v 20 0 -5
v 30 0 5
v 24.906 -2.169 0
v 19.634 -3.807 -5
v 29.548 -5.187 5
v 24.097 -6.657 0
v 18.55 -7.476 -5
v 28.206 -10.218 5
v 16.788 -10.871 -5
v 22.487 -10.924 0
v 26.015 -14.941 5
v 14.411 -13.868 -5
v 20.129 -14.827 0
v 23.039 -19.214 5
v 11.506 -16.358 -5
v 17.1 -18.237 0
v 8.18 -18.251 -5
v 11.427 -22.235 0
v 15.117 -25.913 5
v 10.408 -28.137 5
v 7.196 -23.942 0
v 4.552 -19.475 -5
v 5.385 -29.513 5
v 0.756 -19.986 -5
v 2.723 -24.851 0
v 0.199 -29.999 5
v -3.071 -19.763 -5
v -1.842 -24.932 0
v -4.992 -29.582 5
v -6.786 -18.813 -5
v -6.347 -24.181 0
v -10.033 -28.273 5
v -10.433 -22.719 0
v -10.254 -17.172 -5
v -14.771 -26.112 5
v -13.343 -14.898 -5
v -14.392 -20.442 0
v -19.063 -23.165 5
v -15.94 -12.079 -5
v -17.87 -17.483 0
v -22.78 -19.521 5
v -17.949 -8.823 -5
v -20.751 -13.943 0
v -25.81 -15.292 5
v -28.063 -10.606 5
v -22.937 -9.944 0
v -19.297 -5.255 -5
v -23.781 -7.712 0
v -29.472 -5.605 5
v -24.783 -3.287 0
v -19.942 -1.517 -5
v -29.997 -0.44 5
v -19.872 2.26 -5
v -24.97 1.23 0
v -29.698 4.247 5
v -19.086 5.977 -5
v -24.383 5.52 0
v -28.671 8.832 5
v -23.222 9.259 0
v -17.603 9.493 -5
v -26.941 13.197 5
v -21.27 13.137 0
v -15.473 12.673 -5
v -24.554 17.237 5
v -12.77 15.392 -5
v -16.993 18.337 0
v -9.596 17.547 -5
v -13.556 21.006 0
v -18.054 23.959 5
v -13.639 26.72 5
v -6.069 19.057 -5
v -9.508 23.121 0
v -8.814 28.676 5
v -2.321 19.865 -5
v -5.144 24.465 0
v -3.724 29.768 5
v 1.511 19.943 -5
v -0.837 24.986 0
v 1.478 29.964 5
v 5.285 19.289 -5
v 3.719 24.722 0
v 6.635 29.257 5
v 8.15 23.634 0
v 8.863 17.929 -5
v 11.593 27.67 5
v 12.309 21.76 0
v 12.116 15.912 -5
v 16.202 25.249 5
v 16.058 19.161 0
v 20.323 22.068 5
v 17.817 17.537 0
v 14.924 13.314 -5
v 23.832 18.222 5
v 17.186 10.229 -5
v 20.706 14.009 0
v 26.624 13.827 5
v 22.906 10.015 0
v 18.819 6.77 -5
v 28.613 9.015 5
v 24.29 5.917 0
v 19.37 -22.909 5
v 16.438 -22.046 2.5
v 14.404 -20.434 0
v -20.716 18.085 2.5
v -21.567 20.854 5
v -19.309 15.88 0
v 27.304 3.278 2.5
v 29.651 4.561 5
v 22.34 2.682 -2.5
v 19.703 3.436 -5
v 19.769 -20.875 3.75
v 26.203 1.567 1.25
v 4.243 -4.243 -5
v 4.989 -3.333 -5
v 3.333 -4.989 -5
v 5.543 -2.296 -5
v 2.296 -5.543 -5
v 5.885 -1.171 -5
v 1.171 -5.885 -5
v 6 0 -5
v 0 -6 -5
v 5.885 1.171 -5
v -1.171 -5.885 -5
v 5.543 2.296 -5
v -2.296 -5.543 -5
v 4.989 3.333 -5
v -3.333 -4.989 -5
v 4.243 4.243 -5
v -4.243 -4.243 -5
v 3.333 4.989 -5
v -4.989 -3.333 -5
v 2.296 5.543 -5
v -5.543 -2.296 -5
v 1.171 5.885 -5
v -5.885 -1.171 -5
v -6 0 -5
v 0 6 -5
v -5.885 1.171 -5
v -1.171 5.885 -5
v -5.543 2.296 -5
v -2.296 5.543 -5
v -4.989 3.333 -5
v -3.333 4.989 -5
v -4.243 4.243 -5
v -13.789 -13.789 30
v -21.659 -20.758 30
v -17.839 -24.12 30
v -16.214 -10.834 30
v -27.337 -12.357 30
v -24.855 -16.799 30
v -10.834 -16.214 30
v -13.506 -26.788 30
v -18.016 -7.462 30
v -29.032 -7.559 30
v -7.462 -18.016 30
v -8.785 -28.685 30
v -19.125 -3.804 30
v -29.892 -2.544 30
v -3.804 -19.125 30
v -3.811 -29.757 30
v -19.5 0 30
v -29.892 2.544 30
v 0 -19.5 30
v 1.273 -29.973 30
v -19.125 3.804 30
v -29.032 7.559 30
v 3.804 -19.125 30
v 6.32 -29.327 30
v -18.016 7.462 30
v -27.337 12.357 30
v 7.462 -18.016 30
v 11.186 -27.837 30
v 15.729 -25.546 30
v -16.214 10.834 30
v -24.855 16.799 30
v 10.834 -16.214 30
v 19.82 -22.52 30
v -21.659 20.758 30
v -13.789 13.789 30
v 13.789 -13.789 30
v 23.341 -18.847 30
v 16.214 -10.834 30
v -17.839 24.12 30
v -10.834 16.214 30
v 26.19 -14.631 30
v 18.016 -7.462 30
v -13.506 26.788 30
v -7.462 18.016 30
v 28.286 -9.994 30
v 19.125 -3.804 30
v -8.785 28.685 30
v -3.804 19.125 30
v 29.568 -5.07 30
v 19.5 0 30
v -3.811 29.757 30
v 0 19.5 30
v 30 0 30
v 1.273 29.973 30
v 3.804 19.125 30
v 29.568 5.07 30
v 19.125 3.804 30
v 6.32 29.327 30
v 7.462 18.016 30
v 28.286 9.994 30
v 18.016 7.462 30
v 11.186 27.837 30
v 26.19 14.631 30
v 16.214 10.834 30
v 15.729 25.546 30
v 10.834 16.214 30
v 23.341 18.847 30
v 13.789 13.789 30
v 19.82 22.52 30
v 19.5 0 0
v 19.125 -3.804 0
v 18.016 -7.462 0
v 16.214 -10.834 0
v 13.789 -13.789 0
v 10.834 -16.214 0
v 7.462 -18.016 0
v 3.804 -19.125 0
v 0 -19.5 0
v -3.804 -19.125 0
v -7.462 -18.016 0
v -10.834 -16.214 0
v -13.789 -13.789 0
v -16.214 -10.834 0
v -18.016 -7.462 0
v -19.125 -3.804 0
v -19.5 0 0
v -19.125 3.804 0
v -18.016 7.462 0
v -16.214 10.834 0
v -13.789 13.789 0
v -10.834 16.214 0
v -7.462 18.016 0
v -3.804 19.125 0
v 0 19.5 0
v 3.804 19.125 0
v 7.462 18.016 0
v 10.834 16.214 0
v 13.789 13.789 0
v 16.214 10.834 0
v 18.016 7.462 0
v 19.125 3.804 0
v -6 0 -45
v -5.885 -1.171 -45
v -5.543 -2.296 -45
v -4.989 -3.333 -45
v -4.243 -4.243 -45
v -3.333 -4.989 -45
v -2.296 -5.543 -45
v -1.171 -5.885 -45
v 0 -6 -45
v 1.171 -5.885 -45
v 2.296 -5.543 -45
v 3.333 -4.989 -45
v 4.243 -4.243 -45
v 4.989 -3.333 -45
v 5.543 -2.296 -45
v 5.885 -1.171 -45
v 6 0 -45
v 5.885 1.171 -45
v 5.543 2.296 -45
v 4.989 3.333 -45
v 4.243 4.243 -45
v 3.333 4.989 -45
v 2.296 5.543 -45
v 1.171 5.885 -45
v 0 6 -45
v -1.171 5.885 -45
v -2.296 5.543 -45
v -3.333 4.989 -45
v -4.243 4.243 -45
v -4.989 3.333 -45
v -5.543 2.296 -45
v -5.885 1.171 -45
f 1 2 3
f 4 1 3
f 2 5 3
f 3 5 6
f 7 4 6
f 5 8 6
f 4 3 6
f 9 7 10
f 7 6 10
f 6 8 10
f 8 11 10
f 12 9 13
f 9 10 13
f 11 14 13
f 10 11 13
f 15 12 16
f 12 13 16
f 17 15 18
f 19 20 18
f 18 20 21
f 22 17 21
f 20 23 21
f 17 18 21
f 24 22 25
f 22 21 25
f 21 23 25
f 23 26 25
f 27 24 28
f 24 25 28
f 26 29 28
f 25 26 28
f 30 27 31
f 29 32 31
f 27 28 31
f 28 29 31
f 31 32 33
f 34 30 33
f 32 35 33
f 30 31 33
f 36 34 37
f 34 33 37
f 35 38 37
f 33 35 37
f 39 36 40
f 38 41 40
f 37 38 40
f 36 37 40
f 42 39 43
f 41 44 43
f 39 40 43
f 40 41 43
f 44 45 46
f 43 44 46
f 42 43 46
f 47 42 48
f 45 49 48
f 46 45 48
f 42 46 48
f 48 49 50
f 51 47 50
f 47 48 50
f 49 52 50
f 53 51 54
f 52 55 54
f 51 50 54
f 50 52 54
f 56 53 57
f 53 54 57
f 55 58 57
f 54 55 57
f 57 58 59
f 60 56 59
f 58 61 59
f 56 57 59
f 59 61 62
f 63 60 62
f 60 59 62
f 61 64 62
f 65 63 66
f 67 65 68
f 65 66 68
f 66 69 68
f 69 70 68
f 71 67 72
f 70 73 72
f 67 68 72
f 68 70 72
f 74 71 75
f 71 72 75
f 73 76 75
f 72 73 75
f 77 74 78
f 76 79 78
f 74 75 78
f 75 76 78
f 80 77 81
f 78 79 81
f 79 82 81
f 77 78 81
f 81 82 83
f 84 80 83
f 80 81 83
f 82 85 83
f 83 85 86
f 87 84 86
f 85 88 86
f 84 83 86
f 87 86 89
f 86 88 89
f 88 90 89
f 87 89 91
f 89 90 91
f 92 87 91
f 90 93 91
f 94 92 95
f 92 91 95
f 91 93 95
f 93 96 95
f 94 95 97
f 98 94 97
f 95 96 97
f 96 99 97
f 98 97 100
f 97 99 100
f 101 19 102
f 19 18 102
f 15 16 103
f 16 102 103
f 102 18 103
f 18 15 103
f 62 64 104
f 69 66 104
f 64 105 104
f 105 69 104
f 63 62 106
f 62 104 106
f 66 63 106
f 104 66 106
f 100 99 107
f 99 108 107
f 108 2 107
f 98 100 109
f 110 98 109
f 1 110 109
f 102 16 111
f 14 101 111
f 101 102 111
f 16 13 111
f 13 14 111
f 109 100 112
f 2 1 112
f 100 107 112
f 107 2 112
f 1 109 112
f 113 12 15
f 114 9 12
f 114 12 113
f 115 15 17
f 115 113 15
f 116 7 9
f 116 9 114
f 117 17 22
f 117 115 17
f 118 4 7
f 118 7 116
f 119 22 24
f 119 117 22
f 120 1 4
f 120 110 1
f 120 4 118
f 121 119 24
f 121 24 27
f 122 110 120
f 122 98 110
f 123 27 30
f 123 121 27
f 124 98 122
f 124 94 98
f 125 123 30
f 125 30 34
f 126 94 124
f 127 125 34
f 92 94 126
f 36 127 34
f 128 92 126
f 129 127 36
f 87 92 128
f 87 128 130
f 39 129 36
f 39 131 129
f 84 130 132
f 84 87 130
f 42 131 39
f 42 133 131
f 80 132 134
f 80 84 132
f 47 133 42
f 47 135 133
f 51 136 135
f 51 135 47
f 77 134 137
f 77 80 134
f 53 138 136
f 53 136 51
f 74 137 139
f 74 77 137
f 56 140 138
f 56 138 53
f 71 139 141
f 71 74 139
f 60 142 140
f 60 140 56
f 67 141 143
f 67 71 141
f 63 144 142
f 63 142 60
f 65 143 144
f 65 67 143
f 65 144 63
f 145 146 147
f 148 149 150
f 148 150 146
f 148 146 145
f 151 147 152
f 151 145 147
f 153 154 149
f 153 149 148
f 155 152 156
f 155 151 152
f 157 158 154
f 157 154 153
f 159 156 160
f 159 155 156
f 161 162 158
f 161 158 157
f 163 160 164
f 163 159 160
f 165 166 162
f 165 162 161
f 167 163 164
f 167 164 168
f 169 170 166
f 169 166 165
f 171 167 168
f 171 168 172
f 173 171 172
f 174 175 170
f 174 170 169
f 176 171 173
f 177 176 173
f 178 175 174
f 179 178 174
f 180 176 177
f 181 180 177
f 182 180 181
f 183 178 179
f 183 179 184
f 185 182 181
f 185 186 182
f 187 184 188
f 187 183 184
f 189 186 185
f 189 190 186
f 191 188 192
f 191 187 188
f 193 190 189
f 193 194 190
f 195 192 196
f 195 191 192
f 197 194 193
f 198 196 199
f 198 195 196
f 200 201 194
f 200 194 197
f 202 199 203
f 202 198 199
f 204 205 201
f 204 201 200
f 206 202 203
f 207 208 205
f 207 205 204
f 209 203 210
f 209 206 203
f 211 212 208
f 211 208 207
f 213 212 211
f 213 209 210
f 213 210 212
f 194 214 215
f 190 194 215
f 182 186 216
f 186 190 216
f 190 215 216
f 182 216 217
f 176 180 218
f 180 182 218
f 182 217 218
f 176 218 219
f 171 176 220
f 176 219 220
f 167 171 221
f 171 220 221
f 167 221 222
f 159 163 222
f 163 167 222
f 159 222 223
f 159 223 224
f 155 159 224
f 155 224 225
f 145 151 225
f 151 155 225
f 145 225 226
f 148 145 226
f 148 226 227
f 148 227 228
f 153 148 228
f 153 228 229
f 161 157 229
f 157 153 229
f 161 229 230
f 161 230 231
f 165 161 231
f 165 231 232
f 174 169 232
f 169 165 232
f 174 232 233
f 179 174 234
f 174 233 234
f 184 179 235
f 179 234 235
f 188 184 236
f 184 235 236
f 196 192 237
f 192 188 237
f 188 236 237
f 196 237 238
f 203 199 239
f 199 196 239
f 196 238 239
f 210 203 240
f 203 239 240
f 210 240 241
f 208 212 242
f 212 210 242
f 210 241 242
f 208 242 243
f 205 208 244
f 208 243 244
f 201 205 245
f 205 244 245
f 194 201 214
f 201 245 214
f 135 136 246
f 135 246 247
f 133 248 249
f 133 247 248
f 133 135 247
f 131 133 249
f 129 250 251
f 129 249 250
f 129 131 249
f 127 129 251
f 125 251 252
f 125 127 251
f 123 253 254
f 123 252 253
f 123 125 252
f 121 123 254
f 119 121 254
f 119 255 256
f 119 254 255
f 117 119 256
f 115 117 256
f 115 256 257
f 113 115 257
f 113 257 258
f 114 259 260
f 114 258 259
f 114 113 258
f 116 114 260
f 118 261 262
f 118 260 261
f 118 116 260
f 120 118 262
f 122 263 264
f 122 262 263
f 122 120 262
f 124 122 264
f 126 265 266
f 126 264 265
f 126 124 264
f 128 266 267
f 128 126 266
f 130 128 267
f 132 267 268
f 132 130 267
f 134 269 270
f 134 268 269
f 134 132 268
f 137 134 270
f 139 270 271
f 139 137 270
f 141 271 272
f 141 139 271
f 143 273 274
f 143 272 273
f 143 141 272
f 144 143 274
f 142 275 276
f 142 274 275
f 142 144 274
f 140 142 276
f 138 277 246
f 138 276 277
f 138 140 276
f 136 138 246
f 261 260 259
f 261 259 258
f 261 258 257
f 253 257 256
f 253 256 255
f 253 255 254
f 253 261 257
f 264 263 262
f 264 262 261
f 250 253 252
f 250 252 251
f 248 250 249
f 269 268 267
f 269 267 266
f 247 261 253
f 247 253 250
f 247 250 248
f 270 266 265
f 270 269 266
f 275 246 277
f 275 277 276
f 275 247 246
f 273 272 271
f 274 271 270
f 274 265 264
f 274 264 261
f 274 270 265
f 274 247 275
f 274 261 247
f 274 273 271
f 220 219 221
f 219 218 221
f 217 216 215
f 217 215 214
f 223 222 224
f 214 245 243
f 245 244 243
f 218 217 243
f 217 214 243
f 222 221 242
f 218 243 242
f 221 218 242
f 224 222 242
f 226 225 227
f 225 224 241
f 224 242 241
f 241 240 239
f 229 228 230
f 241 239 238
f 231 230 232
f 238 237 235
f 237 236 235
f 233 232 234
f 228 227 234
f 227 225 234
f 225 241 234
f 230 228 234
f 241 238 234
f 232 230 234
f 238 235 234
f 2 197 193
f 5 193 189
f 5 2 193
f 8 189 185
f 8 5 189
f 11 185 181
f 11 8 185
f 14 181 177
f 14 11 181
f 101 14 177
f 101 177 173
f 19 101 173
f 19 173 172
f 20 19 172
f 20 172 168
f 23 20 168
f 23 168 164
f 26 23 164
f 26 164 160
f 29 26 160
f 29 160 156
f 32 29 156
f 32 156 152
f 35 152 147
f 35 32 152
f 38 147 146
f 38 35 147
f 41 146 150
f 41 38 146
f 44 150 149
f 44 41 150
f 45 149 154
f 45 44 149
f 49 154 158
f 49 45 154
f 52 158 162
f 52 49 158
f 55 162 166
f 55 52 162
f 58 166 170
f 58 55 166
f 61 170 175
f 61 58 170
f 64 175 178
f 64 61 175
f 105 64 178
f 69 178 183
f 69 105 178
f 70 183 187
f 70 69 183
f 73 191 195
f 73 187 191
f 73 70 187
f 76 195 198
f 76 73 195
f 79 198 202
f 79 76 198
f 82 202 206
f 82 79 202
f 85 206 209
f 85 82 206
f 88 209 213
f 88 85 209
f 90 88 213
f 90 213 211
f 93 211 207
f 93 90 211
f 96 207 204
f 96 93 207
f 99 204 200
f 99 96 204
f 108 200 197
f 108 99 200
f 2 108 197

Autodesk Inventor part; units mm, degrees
ref_plane "YZ Plane" through (0, 0, 0) normal (1, 0, 0) x (0, 1, 0)
ref_plane "XZ Plane" through (0, 0, 0) normal (0, 1, 0) x (-1, 0, 0)
ref_plane "XY Plane" through (0, 0, 0) normal (0, 0, 1) x (1, 0, 0)
sketch "スケッチ1" plane through (0, 0, 0) normal (0, 0, 1) x (1, 0, 0)
  circle A0 centre (0, 0) radius 30
  circle A1 centre (0, 0) radius 19.5
  dimension "d0" = 60
  dimension "d1" = 39
extrude "押し出し1" add sketch "スケッチ1" along normal blind 30
sketch "スケッチ3" plane through (0, 0, 0) normal (0, 0, -1) x (-1, 0, 0)
  circle A0 centre (0, 0) radius 30 projected
  circle A1 centre (0, 0) radius 19.5 projected
extrude "押し出し2" add sketch "スケッチ3" along normal blind 5 contours A0 | A1
sketch "スケッチ4" plane through (0, 0, -5) normal (0, 0, -1) x (-1, 0, 0)
  circle A0 centre (0, 0) radius 6
  dimension "d6" = 12
extrude "押し出し3" add sketch "スケッチ4" along normal blind 40
chamfer "面取り1" distance 10 angle 45 1 edges at (30, 0, -5)
properties part number "encoder_shaft_3D プリント"
